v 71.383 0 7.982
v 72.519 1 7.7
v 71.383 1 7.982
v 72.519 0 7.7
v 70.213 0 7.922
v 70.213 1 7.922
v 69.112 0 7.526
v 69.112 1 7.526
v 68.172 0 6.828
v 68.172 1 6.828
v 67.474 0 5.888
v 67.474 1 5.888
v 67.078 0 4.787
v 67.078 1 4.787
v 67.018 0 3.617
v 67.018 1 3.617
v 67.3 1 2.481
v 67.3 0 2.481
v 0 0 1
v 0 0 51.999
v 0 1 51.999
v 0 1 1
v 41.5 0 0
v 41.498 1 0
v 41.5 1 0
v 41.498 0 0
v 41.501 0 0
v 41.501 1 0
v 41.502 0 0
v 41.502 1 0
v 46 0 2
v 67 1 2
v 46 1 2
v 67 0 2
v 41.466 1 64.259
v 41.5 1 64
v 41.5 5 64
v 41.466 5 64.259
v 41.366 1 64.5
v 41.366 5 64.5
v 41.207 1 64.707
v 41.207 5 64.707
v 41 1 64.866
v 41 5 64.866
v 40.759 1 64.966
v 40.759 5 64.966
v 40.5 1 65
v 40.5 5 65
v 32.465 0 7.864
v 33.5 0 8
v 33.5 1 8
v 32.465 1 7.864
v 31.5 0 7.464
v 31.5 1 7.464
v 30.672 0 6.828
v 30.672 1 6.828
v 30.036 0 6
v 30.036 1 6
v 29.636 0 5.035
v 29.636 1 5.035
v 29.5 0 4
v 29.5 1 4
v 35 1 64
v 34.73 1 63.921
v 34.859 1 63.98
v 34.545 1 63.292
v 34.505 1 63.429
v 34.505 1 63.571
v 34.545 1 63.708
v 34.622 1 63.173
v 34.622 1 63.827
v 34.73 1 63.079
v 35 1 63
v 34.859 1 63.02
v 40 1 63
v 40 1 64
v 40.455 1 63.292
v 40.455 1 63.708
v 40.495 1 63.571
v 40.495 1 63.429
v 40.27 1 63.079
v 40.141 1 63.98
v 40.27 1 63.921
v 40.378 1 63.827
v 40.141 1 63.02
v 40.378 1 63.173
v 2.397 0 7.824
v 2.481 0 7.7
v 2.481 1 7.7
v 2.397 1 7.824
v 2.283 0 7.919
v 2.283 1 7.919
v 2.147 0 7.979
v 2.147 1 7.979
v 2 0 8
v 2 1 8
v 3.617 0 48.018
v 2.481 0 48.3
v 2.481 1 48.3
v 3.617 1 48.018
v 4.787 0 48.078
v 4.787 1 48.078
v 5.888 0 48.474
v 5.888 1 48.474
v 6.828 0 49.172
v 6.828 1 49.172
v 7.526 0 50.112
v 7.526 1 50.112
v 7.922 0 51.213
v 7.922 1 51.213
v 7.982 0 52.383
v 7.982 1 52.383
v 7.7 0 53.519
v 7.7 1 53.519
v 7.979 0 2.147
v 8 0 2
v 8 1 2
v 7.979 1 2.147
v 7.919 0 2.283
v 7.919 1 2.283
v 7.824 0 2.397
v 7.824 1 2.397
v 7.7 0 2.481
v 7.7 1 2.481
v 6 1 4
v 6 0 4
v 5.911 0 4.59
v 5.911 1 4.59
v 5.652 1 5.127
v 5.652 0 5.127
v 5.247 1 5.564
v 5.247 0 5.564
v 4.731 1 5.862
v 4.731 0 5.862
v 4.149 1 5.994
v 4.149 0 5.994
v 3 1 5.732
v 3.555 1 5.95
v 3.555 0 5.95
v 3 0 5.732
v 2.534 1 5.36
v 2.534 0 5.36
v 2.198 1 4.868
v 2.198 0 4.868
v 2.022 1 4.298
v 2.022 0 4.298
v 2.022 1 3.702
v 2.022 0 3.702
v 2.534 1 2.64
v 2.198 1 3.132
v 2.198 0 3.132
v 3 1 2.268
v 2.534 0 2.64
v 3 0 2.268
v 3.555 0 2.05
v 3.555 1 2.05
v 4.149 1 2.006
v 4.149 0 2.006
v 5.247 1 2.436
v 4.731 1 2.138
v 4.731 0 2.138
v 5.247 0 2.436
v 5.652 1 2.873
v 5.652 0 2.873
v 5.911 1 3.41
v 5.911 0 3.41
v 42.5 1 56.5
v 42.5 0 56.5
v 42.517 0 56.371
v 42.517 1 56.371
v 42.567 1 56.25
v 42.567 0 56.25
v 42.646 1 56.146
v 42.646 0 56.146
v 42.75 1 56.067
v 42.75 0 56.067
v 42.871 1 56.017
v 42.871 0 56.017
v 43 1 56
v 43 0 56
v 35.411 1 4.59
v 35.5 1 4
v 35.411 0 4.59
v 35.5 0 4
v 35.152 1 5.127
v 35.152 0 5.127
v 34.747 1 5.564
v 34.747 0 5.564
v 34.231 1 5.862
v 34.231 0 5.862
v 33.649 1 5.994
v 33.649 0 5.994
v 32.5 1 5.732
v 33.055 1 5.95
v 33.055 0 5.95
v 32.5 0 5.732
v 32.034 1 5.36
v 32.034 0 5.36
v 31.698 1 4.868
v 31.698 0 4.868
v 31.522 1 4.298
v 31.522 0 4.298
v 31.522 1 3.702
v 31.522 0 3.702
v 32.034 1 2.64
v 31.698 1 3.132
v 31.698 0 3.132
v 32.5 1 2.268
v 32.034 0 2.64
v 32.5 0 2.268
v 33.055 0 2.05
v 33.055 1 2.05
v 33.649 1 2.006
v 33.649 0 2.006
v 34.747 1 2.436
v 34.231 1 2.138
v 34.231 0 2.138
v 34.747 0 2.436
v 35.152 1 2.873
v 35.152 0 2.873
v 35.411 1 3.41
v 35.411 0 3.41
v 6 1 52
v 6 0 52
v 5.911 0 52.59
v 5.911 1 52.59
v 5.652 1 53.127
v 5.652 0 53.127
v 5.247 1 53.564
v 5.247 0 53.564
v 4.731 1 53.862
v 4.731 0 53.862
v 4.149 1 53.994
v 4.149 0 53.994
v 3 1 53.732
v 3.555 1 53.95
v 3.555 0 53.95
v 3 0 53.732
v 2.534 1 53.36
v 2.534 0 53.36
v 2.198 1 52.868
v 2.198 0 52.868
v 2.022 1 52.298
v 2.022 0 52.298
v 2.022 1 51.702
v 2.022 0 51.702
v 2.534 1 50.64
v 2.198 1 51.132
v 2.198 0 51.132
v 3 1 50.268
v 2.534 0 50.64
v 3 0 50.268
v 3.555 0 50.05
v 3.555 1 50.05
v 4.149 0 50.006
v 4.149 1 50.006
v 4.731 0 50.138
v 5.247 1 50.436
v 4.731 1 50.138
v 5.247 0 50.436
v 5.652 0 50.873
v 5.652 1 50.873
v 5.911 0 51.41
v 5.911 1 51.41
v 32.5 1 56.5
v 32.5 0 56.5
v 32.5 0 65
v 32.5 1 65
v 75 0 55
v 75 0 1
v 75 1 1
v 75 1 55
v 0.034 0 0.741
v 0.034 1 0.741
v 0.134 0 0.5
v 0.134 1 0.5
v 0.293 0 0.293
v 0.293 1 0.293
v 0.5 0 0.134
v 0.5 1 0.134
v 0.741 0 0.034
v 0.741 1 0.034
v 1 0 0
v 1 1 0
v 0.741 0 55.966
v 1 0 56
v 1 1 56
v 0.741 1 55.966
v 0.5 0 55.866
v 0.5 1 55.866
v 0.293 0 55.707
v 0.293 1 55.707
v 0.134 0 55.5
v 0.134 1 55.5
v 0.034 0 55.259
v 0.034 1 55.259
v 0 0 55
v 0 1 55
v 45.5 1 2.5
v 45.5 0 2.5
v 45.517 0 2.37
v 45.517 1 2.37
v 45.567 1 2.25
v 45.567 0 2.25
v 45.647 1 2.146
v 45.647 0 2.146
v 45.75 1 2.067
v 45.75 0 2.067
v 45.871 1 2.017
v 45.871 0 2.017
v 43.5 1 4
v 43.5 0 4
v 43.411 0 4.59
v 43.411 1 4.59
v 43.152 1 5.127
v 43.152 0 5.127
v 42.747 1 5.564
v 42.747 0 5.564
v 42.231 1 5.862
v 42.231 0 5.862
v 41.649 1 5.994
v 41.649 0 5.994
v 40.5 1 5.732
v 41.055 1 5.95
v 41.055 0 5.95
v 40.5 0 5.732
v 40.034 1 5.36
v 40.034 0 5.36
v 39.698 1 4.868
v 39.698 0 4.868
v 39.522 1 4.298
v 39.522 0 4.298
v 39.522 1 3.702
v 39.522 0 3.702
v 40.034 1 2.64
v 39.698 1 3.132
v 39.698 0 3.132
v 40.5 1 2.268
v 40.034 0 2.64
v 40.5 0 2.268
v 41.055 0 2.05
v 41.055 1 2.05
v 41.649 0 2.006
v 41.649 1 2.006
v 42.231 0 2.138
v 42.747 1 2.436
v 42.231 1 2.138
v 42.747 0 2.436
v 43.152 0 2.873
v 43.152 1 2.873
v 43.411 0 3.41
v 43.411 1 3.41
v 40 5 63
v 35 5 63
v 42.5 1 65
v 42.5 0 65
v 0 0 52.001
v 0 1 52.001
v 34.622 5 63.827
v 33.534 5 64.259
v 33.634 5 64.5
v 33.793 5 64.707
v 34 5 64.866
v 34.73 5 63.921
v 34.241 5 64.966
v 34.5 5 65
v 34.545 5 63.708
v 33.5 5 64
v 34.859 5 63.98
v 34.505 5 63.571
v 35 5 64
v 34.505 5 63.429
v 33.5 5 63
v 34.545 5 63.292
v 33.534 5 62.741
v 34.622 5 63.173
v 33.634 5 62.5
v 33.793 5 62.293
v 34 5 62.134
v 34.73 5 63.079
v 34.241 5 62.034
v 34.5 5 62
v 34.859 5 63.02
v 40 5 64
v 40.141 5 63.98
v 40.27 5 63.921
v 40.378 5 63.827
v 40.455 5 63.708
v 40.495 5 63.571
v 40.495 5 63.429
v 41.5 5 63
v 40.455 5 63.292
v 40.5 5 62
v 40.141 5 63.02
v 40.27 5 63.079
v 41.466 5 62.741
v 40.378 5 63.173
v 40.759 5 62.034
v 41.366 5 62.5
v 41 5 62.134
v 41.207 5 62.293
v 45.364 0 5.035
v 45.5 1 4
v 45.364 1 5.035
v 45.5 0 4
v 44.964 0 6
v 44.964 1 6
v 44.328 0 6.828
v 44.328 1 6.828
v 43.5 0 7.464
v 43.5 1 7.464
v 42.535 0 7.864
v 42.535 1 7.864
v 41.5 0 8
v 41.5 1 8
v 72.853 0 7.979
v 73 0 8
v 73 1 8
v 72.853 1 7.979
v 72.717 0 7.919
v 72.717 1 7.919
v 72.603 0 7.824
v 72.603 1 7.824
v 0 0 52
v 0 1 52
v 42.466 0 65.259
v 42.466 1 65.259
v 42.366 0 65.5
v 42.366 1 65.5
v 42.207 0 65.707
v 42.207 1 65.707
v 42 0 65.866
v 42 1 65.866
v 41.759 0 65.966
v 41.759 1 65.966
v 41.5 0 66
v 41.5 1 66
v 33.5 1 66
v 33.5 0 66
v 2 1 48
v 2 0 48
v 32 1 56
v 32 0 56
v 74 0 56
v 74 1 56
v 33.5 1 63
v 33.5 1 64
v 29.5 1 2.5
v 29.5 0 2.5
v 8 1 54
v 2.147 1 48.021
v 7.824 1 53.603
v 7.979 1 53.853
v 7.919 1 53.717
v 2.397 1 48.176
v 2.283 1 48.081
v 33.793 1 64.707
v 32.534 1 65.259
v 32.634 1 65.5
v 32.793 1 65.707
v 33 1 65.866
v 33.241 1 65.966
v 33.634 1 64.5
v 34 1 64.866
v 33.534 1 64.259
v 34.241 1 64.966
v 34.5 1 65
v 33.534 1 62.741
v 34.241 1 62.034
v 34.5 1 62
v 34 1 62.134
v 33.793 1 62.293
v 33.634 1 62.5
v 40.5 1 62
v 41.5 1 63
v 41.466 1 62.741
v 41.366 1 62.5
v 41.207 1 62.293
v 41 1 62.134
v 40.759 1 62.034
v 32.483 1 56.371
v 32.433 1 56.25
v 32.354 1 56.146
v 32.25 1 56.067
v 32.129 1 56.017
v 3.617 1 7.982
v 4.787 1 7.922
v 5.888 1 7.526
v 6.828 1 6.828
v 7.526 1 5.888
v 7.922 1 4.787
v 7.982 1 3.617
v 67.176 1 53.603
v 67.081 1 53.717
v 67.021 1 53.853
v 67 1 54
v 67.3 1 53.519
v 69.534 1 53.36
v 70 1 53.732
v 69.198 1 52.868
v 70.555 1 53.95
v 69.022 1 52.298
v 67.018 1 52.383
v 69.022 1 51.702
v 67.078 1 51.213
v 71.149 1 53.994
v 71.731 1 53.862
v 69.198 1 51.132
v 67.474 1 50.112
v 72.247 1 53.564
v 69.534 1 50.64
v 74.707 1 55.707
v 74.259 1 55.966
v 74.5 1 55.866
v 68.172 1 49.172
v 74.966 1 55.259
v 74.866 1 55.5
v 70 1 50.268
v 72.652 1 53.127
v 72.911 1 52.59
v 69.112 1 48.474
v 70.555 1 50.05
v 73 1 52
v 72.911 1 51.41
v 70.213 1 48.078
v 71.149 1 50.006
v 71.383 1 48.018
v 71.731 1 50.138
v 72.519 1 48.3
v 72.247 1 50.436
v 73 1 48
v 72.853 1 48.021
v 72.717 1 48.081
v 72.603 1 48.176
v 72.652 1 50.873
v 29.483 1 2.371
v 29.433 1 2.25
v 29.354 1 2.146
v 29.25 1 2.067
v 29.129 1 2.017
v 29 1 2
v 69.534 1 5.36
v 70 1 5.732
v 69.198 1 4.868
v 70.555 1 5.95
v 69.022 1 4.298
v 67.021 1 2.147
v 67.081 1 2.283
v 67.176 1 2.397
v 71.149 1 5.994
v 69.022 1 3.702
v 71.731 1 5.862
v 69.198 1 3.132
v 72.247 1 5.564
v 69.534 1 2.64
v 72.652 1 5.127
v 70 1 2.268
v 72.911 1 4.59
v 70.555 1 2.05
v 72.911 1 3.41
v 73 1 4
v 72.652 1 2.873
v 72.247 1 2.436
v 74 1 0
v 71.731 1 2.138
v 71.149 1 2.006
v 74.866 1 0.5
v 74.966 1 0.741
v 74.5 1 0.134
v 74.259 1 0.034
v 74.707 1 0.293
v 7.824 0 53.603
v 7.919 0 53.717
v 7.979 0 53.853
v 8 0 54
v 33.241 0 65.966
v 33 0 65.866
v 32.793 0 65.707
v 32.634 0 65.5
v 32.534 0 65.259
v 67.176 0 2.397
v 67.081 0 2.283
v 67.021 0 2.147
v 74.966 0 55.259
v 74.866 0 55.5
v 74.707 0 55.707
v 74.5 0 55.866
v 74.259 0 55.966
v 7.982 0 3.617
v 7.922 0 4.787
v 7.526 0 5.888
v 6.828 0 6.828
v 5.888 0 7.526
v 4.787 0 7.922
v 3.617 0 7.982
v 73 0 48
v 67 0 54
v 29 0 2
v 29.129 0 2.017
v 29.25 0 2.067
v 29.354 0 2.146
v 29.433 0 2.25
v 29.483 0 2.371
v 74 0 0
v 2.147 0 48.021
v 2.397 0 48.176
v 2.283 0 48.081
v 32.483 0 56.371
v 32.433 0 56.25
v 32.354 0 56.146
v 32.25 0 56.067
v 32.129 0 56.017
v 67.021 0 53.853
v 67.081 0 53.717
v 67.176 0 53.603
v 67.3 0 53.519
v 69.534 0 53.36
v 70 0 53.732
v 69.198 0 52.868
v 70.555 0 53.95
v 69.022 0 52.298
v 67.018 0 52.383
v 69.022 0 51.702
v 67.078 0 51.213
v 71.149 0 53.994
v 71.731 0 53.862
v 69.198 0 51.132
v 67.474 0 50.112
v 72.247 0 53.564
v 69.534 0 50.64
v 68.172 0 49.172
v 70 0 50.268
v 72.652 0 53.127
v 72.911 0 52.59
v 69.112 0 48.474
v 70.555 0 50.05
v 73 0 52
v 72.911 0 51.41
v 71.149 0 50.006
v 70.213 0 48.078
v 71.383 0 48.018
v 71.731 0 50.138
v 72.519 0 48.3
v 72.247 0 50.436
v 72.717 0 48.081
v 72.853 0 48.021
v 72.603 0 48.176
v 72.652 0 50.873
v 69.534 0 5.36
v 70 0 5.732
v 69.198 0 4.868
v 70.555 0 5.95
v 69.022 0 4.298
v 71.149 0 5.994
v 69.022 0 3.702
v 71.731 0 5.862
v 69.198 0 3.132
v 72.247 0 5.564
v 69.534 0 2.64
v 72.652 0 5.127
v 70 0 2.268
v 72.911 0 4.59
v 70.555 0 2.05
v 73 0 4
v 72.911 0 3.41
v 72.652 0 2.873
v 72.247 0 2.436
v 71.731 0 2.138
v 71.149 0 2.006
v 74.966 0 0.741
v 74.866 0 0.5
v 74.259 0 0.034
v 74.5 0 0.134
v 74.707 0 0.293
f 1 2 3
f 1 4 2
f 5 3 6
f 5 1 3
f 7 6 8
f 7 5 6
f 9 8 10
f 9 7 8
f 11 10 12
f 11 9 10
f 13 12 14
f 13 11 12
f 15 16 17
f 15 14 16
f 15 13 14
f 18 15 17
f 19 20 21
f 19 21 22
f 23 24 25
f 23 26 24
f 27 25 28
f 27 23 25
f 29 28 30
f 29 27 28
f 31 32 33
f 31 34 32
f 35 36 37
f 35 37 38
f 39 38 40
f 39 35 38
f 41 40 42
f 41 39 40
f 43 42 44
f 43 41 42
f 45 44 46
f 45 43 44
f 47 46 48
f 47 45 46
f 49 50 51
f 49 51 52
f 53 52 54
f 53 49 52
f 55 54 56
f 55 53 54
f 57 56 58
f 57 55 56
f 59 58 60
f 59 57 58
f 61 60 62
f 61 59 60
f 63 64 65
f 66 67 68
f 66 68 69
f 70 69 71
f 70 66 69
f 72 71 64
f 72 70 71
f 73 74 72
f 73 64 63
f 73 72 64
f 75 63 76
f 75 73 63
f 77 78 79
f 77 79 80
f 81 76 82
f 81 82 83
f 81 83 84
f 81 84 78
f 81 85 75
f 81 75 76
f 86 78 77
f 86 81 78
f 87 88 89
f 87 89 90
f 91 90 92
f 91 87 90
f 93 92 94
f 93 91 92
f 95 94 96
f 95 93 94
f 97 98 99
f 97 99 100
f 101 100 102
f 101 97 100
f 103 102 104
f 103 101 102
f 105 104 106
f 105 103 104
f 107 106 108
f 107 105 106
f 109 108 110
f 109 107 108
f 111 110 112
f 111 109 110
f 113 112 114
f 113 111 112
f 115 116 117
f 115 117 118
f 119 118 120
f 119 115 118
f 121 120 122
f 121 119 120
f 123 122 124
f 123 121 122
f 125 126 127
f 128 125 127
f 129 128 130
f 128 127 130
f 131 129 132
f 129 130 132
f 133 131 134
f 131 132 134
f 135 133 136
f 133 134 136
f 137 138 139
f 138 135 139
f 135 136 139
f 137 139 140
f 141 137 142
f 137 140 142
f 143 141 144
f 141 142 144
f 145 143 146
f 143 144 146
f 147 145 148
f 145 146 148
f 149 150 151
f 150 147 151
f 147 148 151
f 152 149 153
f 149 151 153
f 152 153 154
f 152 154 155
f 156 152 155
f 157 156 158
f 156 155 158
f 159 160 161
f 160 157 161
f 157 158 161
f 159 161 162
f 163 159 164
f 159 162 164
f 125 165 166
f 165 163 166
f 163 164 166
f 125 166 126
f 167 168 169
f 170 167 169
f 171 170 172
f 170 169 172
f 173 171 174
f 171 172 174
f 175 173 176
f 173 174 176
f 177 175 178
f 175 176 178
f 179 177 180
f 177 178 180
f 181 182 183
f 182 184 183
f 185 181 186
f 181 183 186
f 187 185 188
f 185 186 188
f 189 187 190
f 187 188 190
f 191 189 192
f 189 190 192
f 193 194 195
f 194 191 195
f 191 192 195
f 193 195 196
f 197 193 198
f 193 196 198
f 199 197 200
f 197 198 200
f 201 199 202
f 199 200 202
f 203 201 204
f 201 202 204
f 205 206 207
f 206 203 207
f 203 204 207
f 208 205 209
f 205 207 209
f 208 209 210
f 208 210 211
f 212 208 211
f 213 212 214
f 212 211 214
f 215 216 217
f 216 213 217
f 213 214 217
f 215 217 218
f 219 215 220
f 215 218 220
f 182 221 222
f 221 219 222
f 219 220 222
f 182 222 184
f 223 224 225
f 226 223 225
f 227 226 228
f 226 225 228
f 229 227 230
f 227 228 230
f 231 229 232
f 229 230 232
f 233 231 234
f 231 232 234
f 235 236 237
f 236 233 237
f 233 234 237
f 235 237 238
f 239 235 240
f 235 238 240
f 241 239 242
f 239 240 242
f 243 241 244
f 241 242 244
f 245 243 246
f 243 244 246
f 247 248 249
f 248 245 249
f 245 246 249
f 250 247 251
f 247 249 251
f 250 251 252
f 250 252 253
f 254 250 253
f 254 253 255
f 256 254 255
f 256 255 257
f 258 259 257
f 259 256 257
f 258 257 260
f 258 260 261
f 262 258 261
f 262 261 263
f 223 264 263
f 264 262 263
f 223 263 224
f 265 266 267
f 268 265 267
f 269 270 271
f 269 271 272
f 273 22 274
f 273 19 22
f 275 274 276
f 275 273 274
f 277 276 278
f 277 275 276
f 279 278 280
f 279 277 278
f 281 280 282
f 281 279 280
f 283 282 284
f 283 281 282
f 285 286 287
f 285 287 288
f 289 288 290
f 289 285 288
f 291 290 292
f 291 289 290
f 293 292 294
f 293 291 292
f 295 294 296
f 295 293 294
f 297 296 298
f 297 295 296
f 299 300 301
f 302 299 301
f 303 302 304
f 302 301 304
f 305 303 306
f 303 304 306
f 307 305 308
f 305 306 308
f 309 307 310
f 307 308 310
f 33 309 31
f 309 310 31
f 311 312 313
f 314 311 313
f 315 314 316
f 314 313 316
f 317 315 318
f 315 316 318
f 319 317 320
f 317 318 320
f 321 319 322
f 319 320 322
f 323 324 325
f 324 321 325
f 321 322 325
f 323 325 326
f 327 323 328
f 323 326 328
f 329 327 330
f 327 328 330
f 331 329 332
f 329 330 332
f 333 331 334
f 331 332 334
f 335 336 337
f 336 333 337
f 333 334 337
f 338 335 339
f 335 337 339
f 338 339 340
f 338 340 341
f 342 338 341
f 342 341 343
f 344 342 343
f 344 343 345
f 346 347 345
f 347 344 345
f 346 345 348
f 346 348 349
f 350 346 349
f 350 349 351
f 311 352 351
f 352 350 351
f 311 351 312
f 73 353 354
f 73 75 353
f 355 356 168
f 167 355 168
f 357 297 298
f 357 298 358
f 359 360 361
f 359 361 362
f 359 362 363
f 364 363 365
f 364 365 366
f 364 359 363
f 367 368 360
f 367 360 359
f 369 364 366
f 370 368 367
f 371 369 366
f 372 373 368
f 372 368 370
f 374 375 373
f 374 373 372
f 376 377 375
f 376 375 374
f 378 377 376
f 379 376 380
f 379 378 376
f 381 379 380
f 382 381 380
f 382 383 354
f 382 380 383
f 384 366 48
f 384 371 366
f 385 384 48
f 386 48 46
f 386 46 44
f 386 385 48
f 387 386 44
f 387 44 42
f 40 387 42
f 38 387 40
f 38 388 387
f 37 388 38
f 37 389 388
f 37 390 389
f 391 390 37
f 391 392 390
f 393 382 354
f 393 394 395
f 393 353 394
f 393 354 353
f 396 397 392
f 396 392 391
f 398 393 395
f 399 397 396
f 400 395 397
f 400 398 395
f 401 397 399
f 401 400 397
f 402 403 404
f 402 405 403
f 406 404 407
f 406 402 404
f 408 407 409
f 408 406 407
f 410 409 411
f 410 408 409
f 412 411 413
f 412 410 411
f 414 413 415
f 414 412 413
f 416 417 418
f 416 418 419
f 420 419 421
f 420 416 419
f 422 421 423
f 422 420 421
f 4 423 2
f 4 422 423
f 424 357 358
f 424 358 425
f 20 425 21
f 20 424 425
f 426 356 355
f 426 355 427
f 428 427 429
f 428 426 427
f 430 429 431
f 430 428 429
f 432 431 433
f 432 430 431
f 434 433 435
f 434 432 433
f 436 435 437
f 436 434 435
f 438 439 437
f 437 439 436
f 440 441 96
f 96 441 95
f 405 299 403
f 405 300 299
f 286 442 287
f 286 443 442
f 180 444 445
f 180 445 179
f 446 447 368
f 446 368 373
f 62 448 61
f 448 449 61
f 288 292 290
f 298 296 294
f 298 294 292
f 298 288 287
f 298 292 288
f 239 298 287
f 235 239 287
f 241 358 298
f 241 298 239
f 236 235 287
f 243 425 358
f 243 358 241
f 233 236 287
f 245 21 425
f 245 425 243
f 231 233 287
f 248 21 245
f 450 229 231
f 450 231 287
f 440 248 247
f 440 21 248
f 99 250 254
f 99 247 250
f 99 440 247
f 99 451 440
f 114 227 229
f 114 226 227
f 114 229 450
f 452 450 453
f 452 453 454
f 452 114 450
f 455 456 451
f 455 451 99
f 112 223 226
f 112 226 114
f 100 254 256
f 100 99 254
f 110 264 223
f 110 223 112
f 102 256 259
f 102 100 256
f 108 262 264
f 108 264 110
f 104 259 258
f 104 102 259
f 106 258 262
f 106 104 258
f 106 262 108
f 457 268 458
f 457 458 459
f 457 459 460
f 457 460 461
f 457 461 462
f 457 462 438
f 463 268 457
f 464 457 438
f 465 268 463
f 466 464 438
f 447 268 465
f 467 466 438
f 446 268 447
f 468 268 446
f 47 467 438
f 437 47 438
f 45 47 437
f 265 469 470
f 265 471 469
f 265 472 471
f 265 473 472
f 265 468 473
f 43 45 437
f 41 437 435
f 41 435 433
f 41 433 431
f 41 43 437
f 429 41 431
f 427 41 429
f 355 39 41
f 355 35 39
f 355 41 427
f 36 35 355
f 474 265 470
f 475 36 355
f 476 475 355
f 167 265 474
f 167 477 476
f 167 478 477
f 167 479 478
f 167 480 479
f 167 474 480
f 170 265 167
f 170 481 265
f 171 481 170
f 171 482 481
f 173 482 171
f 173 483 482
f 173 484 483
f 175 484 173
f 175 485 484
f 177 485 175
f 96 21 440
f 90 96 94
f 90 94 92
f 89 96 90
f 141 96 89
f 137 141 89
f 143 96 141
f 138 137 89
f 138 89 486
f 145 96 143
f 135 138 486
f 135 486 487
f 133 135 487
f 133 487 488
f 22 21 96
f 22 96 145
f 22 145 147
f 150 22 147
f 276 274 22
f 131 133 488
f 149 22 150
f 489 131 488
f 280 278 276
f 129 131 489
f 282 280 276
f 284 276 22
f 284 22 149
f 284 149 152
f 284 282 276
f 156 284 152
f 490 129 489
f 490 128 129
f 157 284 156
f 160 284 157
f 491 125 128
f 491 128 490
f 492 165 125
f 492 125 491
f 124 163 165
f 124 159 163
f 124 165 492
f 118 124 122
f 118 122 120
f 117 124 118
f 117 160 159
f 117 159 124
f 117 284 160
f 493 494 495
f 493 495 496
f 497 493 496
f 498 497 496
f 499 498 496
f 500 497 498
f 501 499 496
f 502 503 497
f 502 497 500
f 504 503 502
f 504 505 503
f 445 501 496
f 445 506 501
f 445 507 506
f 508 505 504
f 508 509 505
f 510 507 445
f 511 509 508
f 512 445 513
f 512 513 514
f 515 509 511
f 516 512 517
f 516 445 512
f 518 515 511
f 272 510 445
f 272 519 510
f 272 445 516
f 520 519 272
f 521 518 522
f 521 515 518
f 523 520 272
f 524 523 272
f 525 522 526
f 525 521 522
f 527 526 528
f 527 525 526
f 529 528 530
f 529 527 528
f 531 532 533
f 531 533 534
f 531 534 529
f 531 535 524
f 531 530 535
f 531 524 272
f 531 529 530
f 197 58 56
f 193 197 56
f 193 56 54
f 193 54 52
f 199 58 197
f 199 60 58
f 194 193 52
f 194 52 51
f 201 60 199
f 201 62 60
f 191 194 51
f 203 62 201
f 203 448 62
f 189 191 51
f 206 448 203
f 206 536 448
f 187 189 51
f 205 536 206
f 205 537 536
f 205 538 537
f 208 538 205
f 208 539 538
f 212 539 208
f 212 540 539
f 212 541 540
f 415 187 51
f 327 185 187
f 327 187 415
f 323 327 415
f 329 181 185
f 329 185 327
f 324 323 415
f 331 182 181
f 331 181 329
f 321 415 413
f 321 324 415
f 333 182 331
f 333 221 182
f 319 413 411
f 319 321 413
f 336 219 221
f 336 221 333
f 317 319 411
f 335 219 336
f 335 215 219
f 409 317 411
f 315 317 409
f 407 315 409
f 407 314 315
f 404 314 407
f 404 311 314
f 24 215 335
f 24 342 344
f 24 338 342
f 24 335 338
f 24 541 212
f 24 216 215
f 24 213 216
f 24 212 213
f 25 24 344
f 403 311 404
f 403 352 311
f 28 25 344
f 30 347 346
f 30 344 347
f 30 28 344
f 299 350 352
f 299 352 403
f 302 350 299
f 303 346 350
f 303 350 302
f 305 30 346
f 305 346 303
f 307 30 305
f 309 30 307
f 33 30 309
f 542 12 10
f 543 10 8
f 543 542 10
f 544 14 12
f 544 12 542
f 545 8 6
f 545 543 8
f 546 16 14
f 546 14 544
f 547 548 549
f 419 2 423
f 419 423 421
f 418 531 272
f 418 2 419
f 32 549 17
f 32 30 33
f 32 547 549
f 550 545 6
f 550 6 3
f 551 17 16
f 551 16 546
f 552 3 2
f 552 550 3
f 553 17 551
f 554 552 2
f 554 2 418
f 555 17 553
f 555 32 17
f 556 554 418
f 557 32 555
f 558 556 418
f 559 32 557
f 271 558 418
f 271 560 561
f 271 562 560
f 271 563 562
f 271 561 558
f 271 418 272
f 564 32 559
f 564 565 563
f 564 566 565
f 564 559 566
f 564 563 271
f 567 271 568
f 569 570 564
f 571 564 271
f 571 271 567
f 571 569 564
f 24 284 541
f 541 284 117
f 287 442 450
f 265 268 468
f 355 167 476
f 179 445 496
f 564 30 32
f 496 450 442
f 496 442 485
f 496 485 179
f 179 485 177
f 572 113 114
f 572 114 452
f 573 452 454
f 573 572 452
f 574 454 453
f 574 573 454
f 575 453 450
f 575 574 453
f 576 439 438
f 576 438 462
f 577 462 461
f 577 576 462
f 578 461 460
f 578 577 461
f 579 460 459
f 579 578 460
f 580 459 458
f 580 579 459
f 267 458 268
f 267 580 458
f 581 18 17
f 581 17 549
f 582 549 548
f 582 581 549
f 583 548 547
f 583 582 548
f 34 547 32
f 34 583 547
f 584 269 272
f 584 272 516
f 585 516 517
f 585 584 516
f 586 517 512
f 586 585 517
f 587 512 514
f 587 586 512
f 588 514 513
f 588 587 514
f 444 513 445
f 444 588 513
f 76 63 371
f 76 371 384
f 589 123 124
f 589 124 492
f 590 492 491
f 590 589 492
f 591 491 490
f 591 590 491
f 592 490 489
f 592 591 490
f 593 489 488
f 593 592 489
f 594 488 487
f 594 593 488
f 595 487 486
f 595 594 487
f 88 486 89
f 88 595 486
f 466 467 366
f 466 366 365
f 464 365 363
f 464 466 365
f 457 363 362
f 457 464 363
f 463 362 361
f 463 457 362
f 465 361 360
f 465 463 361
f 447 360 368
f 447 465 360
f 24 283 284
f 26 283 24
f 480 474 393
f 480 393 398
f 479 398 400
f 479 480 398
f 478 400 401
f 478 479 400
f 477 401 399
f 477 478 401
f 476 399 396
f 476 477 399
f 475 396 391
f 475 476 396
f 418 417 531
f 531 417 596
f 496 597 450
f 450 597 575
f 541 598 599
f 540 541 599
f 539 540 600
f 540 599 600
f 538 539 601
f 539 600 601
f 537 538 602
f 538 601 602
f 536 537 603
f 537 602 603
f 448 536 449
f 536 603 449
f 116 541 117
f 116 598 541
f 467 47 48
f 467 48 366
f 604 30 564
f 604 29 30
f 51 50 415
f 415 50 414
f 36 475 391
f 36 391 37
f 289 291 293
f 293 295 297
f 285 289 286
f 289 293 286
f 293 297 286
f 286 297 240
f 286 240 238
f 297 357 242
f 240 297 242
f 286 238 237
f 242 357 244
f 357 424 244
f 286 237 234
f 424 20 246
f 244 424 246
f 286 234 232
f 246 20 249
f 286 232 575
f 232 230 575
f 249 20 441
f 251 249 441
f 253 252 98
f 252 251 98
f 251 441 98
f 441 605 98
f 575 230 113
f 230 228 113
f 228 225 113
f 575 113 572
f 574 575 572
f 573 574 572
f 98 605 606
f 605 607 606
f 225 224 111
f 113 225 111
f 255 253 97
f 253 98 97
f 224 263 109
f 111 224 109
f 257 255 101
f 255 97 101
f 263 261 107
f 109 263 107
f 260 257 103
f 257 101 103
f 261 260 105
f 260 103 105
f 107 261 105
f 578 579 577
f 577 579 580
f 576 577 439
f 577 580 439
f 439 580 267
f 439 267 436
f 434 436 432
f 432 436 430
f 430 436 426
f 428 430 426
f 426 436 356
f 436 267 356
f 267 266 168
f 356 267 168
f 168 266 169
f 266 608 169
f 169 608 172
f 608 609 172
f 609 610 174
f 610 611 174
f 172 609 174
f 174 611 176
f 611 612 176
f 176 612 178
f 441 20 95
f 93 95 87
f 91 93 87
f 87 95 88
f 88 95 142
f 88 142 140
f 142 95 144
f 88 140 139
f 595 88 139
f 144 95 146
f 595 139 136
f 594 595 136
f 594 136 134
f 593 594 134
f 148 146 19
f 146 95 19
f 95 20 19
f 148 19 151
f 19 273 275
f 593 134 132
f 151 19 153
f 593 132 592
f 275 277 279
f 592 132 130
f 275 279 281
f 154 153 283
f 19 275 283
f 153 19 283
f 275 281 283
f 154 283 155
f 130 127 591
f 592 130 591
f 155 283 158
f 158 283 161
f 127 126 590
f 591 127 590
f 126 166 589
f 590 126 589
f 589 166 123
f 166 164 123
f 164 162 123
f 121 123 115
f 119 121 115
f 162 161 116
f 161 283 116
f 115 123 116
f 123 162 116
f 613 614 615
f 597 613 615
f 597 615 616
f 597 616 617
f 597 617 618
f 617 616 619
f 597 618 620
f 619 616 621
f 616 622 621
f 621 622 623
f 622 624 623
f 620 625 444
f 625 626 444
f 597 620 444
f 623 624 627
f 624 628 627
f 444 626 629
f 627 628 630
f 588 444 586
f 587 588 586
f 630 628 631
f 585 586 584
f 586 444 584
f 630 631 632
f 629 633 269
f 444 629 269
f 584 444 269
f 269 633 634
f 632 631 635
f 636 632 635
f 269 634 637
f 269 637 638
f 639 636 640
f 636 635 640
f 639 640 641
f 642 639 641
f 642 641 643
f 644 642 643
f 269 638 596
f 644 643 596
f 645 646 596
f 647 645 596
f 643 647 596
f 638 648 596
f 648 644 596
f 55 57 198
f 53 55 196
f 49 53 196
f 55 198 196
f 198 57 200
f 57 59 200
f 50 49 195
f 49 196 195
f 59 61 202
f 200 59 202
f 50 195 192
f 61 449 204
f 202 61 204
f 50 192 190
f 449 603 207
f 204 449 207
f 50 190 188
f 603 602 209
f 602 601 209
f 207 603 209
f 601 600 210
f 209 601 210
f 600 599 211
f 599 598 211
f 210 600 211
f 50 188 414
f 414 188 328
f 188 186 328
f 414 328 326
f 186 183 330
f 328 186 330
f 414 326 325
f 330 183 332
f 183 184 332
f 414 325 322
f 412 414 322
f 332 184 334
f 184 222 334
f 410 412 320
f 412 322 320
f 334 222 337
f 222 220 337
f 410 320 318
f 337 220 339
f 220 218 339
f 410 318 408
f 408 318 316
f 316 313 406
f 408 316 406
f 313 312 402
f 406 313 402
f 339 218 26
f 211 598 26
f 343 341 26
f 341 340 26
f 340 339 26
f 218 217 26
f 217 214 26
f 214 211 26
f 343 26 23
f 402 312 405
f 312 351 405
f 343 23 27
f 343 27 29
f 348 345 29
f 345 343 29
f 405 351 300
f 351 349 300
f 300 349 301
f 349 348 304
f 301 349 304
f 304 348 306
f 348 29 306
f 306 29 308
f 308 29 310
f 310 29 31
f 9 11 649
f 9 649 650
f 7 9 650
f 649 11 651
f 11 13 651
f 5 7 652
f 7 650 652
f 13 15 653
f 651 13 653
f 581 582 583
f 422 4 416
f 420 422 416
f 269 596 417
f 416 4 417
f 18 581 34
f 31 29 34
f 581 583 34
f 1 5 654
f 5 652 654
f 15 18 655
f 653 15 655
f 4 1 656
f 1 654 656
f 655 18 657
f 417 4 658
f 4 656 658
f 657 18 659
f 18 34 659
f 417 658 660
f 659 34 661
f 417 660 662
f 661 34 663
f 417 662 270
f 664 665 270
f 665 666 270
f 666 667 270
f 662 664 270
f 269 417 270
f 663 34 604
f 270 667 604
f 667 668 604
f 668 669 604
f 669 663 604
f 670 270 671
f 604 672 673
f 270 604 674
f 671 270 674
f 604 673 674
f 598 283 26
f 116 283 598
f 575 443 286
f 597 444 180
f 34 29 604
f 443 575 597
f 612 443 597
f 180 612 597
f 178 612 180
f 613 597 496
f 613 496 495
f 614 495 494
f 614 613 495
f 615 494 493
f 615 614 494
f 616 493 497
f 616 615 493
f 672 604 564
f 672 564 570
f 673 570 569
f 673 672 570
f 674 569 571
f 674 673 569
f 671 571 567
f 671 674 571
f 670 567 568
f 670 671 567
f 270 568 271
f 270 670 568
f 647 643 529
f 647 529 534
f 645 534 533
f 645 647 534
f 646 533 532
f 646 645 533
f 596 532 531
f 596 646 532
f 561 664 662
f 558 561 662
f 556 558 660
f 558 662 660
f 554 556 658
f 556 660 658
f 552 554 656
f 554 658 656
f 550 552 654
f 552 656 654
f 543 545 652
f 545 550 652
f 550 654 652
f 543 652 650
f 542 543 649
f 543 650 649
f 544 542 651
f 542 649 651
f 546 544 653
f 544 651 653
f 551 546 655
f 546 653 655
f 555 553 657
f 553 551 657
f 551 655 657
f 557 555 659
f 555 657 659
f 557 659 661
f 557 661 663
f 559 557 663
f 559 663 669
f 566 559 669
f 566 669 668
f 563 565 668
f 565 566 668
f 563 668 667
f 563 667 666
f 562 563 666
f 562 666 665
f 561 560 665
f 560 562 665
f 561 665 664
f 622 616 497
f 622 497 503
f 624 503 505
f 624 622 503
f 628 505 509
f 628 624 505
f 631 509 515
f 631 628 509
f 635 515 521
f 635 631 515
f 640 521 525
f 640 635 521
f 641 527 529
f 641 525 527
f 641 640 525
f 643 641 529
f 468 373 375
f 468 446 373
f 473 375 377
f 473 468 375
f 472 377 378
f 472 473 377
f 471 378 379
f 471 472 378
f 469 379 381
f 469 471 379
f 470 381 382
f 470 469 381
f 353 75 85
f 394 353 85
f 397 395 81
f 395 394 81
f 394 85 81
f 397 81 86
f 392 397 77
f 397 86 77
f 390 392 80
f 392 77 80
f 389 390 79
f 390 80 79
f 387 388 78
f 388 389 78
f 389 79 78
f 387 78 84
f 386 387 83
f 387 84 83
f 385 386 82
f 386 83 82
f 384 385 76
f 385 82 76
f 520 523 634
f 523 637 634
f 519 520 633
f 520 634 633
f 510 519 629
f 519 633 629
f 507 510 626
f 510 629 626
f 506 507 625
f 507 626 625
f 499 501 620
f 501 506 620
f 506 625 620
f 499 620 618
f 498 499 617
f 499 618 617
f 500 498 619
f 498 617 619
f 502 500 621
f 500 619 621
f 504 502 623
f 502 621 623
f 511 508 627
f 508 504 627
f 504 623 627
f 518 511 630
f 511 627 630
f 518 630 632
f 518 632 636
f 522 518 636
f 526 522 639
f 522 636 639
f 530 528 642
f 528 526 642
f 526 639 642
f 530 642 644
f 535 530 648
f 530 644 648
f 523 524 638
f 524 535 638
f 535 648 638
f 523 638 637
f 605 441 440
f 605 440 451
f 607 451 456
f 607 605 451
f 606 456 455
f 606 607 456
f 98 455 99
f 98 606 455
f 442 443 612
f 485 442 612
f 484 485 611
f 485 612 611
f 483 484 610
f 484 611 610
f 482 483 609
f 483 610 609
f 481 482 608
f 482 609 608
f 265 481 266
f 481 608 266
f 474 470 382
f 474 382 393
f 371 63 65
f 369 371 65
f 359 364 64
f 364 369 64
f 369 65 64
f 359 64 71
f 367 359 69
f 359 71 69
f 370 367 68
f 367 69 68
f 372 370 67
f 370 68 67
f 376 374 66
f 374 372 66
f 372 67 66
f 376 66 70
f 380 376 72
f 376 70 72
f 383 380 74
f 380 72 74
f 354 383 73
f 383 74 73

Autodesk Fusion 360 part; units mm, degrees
sketch "Sketch1" plane through (0, 0, 0) normal (0, 1, 0) x (1, 0, 0)
  line L0 (1, 0) -> (74, 0)
  line L1 (75, -1) -> (75, -55)
  line L2 (0, -55) -> (0, -1)
  circle A0 centre (4, -4) radius 2
  line L3 (2, -48) -> (2, -8)
  arc A1 (7.7004, -53.519) -> (2.481, -48.2996) centre (4, -52) ccw
  arc A2 (0, -51.9989) -> (0, -52.0011) centre (4, -52) ccw
  arc A3 (0, -55) -> (1, -56) centre (1, -55) ccw
  arc A4 (2.481, -48.2996) -> (2, -48) centre (2, -48.5359) ccw
  arc A5 (8, -54) -> (7.7004, -53.519) centre (7.4641, -54) ccw
  circle A6 centre (4, -52) radius 2
  circle A7 centre (71, -52) radius 2
  line L4 (67, -54) -> (8, -54)
  line L5 (73, -8) -> (73, -48)
  arc A8 (72.519, -48.2996) -> (67.2996, -53.519) centre (71, -52) ccw
  arc A9 (74, -56) -> (75, -55) centre (74, -55) ccw
  arc A10 (73, -48) -> (72.519, -48.2996) centre (73, -48.5359) ccw
  arc A11 (67.2996, -53.519) -> (67, -54) centre (67.5359, -54) ccw
  circle A12 centre (71, -4) radius 2
  arc A13 (75, -1) -> (74, 0) centre (74, -1) ccw
  arc A14 (67.2996, -2.481) -> (72.519, -7.7004) centre (71, -4) ccw
  arc A15 (67, -2) -> (67.2996, -2.481) centre (67.5359, -2) ccw
  arc A16 (72.519, -7.7004) -> (73, -8) centre (73, -7.4641) ccw
  arc A17 (2.481, -7.7004) -> (7.7004, -2.481) centre (4, -4) ccw
  arc A18 (2.481, -7.7004) -> (7.7004, -2.481) centre (4, -4) ccw
  arc A19 (1, 0) -> (0, -1) centre (1, -1) ccw
  arc A20 (2, -8) -> (2.481, -7.7004) centre (2, -7.4641) ccw
  arc A21 (7.7004, -2.481) -> (8, -2) centre (7.4641, -2) ccw
  line L6 (45.5, -2.4997) -> (45.5, -4)
  line L7 (29.5, -2.5) -> (29.5, -4)
  arc A22 (29.5, -2.5) -> (29, -2) centre (29, -2.5) ccw
  arc A23 (46, -2) -> (45.5, -2.5003) centre (46, -2.5) ccw
  line L8 (29, -2) -> (8, -2)
  line L9 (67, -2) -> (46, -2)
  arc A24 (29.5, -4) -> (33.5, -8) centre (33.5, -4) ccw
  arc A25 (41.5, -8) -> (45.5, -4) centre (41.5, -4) ccw
  arc A26 (41.5015, 0) -> (41.4985, 0) centre (41.5, -4) ccw
  line L10 (33.5, -8) -> (41.5, -8)
  circle A27 centre (33.5, -4) radius 2
  circle A28 centre (41.5, -4) radius 2
  line L11 (32.5, -56.5) -> (32.5, -65)
  line L12 (33.5, -66) -> (41.5, -66)
  line L13 (42.5, -65) -> (42.5, -56.5)
  line L14 (33.5, -66) -> (41.5, -66)
  line L15 (74, -56) -> (43, -56)
  line L16 (32, -56) -> (1, -56)
  arc A29 (32.5, -56.5) -> (32, -56) centre (32, -56.5) ccw
  arc A30 (43, -56) -> (42.5, -56.5) centre (43, -56.5) ccw
  arc A31 (32.5, -65) -> (33.5, -66) centre (33.5, -65) ccw
  arc A32 (41.5, -66) -> (42.5, -65) centre (41.5, -65) ccw
  line L17 (42.5, -65) -> (42.5, -64.0151)
  line L18 (32.5, -64.0151) -> (32.5, -65)
  line L19 (35, -64) -> (40, -64)
  line L20 (40, -63) -> (35, -63)
  line L21 (34.5, -62) -> (40.5, -62)
  line L22 (41.5, -63) -> (41.5, -64)
  line L23 (40.5, -65) -> (34.5, -65)
  line L24 (33.5, -64) -> (33.5, -63)
  arc A33 (34.5, -62) -> (33.5, -63) centre (34.5, -63) ccw
  arc A34 (40.5, -65) -> (41.5, -64) centre (40.5, -64) ccw
  arc A35 (40, -64) -> (40, -63) centre (40, -63.5) ccw
  arc A36 (41.5, -63) -> (40.5, -62) centre (40.5, -63) ccw
  arc A37 (33.5, -64) -> (34.5, -65) centre (34.5, -64) ccw
  arc A38 (35, -63) -> (35, -64) centre (35, -63.5) ccw
  dimension "d2" = 4
  dimension "d3" = 4
extrude "Extrude1" add sketch "Sketch1" along normal blind 1 makes body 1 at (36.5, 0, 58.3333) makes body 2 at (38.3333, 0, 63.6667)
extrude "Extrude2" add sketch "Sketch1" along normal blind 5 contours L21 L22 L23 L24 A33 A34 A36 A37 bodies 1 2
